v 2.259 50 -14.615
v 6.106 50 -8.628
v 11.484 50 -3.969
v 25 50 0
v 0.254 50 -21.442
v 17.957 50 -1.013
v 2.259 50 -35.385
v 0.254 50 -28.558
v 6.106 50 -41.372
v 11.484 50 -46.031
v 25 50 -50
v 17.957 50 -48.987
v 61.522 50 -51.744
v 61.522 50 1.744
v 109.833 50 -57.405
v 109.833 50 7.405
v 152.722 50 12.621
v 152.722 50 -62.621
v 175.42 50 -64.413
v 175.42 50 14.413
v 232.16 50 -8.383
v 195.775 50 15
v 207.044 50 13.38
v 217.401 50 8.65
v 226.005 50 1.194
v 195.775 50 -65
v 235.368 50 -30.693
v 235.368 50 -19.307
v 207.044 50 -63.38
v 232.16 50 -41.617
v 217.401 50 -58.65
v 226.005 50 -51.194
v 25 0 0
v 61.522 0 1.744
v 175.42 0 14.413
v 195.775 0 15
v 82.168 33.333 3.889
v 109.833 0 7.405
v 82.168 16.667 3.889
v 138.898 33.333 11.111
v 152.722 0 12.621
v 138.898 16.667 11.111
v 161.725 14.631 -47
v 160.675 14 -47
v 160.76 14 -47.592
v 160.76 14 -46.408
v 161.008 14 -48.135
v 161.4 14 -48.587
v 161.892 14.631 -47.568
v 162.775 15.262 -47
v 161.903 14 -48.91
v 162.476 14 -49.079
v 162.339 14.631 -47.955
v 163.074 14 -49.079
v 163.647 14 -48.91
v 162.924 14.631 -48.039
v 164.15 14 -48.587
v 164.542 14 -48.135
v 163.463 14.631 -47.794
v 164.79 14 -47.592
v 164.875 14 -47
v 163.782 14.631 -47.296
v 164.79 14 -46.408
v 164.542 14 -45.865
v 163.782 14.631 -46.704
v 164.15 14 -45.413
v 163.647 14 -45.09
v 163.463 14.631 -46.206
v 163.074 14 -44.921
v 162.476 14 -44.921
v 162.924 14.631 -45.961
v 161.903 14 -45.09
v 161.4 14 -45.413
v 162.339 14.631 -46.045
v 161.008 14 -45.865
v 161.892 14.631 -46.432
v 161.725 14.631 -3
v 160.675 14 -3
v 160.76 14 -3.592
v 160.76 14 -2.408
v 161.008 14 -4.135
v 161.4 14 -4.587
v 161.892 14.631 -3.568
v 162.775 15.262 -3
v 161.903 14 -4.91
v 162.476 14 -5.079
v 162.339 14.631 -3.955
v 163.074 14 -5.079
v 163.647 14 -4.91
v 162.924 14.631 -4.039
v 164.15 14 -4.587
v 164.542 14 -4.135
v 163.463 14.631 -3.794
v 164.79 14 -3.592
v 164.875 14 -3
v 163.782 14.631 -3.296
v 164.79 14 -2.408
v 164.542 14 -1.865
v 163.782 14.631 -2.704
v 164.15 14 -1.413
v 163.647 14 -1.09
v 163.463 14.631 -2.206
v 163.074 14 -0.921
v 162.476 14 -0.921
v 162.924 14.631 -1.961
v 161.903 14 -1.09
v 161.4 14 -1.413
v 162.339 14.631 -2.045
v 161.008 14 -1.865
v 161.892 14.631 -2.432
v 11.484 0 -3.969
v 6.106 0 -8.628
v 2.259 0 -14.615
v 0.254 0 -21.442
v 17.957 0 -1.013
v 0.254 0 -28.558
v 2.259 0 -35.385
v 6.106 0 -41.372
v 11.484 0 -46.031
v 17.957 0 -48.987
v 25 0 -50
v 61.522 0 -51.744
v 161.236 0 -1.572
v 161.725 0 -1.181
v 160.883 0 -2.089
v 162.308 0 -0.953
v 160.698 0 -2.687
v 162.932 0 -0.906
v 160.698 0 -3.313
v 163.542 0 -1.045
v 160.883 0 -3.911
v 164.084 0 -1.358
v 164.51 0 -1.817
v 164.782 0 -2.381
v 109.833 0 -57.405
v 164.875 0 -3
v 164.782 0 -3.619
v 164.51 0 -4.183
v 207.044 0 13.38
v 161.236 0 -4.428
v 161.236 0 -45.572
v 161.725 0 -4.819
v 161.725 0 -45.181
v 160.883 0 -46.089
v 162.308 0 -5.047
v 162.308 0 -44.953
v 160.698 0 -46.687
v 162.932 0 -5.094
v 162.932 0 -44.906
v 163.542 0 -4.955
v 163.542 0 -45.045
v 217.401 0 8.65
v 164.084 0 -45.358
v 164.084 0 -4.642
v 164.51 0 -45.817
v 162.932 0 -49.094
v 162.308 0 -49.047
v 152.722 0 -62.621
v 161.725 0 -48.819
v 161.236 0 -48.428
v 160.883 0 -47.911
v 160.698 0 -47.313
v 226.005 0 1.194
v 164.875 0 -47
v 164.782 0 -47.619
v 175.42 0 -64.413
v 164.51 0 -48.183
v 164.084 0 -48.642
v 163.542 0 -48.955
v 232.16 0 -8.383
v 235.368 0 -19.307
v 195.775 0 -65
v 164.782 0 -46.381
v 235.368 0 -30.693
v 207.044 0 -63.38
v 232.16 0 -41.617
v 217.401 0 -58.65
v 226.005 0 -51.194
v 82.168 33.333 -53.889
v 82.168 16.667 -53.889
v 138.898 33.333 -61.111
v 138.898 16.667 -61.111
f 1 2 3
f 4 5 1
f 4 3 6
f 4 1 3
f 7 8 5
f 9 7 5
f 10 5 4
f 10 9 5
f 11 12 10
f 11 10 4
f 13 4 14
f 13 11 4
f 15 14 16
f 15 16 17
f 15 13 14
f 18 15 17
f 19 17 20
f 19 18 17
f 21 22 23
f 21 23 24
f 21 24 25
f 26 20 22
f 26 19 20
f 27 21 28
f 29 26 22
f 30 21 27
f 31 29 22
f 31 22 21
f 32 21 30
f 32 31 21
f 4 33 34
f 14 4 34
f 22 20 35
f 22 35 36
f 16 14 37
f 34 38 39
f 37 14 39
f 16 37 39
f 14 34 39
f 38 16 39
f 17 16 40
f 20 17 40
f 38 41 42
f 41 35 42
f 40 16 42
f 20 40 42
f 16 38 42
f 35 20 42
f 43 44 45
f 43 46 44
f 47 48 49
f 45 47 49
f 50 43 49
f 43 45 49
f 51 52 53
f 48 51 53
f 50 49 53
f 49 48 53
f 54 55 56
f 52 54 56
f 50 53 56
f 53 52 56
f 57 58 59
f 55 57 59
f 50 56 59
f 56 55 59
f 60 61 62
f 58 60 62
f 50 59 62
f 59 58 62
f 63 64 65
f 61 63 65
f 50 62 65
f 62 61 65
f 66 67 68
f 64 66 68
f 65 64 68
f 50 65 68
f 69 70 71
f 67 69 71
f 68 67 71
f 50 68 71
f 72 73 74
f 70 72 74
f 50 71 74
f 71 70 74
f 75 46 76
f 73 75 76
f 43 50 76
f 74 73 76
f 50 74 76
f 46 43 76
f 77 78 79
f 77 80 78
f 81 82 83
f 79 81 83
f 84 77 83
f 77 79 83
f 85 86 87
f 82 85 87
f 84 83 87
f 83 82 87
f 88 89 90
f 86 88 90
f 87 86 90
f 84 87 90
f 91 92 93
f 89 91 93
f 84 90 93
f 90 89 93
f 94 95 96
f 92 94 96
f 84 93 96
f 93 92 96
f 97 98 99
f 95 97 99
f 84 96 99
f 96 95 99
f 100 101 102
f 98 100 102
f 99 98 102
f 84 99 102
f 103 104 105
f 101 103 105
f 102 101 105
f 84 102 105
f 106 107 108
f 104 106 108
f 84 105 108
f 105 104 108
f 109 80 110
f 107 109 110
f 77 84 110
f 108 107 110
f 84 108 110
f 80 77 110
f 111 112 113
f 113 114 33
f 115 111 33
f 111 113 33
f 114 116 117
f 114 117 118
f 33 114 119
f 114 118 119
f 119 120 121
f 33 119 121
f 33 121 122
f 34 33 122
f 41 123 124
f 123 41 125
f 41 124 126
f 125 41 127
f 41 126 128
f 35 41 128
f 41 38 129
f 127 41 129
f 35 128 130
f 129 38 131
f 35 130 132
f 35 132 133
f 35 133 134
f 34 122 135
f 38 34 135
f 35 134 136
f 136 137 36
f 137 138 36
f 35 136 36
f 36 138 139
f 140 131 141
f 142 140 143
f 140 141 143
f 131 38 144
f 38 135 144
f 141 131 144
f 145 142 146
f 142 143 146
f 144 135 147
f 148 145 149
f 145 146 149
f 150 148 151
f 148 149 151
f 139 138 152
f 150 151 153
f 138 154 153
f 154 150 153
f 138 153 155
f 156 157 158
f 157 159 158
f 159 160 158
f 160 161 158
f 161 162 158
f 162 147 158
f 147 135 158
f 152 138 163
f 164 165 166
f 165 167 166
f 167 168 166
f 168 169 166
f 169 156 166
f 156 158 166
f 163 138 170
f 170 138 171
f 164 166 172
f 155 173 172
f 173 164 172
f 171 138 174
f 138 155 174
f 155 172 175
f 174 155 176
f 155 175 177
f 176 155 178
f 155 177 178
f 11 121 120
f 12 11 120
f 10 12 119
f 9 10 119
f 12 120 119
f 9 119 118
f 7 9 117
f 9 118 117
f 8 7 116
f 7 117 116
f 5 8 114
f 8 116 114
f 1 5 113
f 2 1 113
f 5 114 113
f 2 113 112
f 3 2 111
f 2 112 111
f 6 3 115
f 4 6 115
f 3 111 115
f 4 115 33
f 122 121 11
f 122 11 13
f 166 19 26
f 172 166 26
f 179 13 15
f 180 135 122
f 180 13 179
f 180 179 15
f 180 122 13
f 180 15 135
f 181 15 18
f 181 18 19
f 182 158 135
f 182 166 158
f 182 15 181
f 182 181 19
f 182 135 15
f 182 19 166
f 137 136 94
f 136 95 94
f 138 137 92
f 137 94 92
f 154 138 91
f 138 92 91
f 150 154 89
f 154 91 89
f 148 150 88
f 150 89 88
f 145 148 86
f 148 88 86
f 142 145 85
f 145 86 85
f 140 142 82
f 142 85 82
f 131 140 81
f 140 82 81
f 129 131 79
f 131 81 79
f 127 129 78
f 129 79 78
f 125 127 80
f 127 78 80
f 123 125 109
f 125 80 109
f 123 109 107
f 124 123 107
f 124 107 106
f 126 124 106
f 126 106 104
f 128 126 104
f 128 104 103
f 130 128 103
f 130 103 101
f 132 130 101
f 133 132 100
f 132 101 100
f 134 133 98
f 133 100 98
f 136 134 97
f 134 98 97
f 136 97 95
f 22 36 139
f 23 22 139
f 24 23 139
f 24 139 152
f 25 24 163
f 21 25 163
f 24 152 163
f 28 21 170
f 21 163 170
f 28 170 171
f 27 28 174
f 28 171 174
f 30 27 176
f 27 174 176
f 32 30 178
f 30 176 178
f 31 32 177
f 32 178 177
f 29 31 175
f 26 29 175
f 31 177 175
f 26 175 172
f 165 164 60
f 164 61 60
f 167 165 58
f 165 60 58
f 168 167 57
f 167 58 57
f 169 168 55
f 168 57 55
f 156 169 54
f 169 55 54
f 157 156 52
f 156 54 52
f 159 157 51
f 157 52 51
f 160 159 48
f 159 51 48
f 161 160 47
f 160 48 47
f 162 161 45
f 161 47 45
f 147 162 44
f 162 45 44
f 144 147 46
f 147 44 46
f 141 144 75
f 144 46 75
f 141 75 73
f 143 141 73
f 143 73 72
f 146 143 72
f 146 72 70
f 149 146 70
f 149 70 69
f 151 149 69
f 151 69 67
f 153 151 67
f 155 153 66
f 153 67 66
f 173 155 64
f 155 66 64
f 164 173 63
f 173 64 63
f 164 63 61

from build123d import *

# Parameters (mm, degrees)
BOSS_EXTRUDE1_DEPTH   = 50
M5_TAPPED_HOLE1_D     = 4.2
M5_TAPPED_HOLE1_DEPTH = 14
M5_TAPPED_HOLE1_TIP   = 1.2618073


with BuildPart() as part:
    # Sketch1 → Boss-Extrude1 (new body)
    with BuildSketch(Plane(origin=(0, 0, 0), x_dir=(1, 0, 0), z_dir=(0, 1, 0))):
        with BuildLine():
            ThreePointArc((25, 50), (0, 25), (25, 0))
            add(Edge.make_bspline(
                [(25, 0), (82.580830765, 0), (138.63084141, -15), (195.775010008, -15)],
                knots=[0, 0, 0, 0, 1, 1, 1, 1], degree=3))
            ThreePointArc((195.775010008, -15), (235.775010008, 25), (195.775010008, 65))
            add(Edge.make_bspline(
                [(25, 50), (82.580830765, 50), (138.63084141, 65), (195.775010008, 65)],
                knots=[0, 0, 0, 0, 1, 1, 1, 1], degree=3))
        make_face()
    extrude(amount=BOSS_EXTRUDE1_DEPTH)

    # M5 Tapped Hole1
    with Locations(Plane(origin=(0, 0, 0), x_dir=(-1, 0, 0), z_dir=(0, -1, 0))):
        with Locations((-162.775010008, 3), (-162.775010008, 47)):
            Hole(M5_TAPPED_HOLE1_D / 2, depth=M5_TAPPED_HOLE1_DEPTH)
            with Locations((0, 0, -(M5_TAPPED_HOLE1_DEPTH + M5_TAPPED_HOLE1_TIP / 2))):  # 118° drill point
                Cone(0, M5_TAPPED_HOLE1_D / 2, M5_TAPPED_HOLE1_TIP, mode=Mode.SUBTRACT)


solid = part.part
